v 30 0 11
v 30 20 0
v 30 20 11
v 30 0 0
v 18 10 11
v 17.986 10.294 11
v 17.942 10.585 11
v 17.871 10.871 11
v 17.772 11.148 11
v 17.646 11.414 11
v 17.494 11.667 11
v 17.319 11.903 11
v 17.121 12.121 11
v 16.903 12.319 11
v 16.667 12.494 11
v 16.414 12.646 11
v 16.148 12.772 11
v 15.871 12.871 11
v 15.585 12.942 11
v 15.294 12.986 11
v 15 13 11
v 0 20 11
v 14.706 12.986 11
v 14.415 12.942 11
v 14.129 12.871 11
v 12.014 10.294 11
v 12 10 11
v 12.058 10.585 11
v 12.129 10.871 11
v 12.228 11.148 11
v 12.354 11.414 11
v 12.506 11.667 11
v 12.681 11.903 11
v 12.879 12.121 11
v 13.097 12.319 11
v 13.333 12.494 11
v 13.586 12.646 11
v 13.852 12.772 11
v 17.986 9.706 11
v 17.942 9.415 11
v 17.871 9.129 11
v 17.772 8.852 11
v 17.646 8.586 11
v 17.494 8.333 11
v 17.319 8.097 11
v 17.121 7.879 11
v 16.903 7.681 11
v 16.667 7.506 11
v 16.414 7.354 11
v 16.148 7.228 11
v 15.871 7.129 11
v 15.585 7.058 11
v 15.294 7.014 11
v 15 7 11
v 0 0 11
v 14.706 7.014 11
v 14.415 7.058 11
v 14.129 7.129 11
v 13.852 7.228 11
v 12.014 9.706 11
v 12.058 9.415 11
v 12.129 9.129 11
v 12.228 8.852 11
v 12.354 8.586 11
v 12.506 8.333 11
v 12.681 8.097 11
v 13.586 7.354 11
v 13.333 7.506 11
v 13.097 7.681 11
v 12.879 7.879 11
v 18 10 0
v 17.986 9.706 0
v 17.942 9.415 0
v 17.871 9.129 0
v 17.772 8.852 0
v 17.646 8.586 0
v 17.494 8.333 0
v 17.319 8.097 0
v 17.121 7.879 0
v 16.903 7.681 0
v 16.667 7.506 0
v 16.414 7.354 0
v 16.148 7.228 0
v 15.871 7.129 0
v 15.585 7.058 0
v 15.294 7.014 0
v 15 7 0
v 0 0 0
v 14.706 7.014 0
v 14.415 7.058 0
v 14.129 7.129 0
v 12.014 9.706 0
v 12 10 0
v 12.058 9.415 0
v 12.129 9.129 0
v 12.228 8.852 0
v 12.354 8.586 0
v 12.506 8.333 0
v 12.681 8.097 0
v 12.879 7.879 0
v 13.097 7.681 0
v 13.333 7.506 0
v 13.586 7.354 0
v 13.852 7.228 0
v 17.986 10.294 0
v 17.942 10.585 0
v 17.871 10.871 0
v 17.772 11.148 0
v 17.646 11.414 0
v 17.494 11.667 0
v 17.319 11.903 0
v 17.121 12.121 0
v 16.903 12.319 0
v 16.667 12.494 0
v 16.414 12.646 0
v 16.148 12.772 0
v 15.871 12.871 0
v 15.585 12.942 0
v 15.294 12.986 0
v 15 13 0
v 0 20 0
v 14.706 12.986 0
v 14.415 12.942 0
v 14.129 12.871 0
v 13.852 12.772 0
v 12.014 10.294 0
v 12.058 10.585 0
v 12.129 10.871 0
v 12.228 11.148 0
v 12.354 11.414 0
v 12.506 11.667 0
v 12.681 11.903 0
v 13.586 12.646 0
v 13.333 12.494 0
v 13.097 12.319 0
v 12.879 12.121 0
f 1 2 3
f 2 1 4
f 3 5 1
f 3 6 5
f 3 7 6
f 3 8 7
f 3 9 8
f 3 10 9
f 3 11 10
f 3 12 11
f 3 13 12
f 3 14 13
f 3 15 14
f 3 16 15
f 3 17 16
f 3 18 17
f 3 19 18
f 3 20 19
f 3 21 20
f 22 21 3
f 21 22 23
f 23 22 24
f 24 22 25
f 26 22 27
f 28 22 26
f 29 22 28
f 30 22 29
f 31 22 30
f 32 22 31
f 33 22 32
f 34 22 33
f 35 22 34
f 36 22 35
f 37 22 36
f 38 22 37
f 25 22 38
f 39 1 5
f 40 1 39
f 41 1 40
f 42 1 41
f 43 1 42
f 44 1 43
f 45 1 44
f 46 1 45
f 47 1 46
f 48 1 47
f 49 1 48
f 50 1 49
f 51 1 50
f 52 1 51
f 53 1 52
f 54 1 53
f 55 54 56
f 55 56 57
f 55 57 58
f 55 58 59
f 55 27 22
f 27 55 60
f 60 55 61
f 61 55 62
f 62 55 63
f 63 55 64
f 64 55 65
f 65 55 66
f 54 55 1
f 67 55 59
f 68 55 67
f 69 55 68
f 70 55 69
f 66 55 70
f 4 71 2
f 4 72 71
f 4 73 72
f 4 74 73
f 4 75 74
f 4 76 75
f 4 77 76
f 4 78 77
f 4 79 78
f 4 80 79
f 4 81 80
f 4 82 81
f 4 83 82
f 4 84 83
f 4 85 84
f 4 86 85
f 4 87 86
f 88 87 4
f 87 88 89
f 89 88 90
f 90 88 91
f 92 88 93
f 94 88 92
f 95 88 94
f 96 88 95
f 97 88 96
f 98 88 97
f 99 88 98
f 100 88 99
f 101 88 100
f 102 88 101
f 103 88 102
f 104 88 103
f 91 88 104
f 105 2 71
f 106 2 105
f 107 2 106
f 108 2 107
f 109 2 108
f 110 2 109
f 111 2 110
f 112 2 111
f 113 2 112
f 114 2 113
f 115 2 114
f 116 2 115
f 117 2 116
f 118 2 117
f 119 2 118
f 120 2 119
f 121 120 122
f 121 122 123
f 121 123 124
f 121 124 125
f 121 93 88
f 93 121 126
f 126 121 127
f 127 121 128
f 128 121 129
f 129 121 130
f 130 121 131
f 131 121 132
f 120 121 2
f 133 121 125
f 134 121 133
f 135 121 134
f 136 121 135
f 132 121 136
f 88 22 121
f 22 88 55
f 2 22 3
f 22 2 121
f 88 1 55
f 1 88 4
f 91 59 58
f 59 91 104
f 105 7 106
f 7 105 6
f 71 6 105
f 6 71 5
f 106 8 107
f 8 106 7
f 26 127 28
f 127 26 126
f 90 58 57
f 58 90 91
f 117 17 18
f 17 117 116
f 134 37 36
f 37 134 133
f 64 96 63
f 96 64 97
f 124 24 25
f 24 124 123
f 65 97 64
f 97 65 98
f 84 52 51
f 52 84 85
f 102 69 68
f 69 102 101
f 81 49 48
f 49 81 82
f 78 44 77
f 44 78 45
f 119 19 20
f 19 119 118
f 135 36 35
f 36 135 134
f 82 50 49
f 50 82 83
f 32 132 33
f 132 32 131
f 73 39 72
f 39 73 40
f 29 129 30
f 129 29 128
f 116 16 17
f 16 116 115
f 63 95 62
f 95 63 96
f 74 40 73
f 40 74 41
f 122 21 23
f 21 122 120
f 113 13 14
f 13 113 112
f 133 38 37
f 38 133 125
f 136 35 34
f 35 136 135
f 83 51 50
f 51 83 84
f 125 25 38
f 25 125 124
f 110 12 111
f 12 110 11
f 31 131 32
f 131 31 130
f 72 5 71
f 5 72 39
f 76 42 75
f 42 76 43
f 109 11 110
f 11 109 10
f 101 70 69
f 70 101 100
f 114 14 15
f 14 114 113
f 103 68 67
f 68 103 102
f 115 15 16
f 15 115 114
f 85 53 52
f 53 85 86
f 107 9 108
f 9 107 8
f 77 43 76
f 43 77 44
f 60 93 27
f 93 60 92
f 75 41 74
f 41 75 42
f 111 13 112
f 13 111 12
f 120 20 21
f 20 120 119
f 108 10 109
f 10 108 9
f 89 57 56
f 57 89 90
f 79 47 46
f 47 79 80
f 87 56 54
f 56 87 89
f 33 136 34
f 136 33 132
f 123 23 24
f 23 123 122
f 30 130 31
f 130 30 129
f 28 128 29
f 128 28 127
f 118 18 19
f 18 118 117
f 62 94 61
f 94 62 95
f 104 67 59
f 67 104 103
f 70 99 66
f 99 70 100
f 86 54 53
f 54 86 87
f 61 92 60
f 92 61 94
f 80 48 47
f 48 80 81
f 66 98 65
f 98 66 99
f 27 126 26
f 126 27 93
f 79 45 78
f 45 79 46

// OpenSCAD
// Mesh source for the seeded volume fault of tools/scad2step.py (TV-015, check C7): the cube.scad
// block 11 mm tall instead of 10 mm, so its mesh volume (6289.48 mm^3 for the 64-sided hole) is 9.1 % above the
// 5717.257 mm^3 cube.csg solid.
difference() {
    cube([30, 20, 11]);
    translate([15, 10, -1]) cylinder(d = 6, h = 13, $fn = 64);
}
